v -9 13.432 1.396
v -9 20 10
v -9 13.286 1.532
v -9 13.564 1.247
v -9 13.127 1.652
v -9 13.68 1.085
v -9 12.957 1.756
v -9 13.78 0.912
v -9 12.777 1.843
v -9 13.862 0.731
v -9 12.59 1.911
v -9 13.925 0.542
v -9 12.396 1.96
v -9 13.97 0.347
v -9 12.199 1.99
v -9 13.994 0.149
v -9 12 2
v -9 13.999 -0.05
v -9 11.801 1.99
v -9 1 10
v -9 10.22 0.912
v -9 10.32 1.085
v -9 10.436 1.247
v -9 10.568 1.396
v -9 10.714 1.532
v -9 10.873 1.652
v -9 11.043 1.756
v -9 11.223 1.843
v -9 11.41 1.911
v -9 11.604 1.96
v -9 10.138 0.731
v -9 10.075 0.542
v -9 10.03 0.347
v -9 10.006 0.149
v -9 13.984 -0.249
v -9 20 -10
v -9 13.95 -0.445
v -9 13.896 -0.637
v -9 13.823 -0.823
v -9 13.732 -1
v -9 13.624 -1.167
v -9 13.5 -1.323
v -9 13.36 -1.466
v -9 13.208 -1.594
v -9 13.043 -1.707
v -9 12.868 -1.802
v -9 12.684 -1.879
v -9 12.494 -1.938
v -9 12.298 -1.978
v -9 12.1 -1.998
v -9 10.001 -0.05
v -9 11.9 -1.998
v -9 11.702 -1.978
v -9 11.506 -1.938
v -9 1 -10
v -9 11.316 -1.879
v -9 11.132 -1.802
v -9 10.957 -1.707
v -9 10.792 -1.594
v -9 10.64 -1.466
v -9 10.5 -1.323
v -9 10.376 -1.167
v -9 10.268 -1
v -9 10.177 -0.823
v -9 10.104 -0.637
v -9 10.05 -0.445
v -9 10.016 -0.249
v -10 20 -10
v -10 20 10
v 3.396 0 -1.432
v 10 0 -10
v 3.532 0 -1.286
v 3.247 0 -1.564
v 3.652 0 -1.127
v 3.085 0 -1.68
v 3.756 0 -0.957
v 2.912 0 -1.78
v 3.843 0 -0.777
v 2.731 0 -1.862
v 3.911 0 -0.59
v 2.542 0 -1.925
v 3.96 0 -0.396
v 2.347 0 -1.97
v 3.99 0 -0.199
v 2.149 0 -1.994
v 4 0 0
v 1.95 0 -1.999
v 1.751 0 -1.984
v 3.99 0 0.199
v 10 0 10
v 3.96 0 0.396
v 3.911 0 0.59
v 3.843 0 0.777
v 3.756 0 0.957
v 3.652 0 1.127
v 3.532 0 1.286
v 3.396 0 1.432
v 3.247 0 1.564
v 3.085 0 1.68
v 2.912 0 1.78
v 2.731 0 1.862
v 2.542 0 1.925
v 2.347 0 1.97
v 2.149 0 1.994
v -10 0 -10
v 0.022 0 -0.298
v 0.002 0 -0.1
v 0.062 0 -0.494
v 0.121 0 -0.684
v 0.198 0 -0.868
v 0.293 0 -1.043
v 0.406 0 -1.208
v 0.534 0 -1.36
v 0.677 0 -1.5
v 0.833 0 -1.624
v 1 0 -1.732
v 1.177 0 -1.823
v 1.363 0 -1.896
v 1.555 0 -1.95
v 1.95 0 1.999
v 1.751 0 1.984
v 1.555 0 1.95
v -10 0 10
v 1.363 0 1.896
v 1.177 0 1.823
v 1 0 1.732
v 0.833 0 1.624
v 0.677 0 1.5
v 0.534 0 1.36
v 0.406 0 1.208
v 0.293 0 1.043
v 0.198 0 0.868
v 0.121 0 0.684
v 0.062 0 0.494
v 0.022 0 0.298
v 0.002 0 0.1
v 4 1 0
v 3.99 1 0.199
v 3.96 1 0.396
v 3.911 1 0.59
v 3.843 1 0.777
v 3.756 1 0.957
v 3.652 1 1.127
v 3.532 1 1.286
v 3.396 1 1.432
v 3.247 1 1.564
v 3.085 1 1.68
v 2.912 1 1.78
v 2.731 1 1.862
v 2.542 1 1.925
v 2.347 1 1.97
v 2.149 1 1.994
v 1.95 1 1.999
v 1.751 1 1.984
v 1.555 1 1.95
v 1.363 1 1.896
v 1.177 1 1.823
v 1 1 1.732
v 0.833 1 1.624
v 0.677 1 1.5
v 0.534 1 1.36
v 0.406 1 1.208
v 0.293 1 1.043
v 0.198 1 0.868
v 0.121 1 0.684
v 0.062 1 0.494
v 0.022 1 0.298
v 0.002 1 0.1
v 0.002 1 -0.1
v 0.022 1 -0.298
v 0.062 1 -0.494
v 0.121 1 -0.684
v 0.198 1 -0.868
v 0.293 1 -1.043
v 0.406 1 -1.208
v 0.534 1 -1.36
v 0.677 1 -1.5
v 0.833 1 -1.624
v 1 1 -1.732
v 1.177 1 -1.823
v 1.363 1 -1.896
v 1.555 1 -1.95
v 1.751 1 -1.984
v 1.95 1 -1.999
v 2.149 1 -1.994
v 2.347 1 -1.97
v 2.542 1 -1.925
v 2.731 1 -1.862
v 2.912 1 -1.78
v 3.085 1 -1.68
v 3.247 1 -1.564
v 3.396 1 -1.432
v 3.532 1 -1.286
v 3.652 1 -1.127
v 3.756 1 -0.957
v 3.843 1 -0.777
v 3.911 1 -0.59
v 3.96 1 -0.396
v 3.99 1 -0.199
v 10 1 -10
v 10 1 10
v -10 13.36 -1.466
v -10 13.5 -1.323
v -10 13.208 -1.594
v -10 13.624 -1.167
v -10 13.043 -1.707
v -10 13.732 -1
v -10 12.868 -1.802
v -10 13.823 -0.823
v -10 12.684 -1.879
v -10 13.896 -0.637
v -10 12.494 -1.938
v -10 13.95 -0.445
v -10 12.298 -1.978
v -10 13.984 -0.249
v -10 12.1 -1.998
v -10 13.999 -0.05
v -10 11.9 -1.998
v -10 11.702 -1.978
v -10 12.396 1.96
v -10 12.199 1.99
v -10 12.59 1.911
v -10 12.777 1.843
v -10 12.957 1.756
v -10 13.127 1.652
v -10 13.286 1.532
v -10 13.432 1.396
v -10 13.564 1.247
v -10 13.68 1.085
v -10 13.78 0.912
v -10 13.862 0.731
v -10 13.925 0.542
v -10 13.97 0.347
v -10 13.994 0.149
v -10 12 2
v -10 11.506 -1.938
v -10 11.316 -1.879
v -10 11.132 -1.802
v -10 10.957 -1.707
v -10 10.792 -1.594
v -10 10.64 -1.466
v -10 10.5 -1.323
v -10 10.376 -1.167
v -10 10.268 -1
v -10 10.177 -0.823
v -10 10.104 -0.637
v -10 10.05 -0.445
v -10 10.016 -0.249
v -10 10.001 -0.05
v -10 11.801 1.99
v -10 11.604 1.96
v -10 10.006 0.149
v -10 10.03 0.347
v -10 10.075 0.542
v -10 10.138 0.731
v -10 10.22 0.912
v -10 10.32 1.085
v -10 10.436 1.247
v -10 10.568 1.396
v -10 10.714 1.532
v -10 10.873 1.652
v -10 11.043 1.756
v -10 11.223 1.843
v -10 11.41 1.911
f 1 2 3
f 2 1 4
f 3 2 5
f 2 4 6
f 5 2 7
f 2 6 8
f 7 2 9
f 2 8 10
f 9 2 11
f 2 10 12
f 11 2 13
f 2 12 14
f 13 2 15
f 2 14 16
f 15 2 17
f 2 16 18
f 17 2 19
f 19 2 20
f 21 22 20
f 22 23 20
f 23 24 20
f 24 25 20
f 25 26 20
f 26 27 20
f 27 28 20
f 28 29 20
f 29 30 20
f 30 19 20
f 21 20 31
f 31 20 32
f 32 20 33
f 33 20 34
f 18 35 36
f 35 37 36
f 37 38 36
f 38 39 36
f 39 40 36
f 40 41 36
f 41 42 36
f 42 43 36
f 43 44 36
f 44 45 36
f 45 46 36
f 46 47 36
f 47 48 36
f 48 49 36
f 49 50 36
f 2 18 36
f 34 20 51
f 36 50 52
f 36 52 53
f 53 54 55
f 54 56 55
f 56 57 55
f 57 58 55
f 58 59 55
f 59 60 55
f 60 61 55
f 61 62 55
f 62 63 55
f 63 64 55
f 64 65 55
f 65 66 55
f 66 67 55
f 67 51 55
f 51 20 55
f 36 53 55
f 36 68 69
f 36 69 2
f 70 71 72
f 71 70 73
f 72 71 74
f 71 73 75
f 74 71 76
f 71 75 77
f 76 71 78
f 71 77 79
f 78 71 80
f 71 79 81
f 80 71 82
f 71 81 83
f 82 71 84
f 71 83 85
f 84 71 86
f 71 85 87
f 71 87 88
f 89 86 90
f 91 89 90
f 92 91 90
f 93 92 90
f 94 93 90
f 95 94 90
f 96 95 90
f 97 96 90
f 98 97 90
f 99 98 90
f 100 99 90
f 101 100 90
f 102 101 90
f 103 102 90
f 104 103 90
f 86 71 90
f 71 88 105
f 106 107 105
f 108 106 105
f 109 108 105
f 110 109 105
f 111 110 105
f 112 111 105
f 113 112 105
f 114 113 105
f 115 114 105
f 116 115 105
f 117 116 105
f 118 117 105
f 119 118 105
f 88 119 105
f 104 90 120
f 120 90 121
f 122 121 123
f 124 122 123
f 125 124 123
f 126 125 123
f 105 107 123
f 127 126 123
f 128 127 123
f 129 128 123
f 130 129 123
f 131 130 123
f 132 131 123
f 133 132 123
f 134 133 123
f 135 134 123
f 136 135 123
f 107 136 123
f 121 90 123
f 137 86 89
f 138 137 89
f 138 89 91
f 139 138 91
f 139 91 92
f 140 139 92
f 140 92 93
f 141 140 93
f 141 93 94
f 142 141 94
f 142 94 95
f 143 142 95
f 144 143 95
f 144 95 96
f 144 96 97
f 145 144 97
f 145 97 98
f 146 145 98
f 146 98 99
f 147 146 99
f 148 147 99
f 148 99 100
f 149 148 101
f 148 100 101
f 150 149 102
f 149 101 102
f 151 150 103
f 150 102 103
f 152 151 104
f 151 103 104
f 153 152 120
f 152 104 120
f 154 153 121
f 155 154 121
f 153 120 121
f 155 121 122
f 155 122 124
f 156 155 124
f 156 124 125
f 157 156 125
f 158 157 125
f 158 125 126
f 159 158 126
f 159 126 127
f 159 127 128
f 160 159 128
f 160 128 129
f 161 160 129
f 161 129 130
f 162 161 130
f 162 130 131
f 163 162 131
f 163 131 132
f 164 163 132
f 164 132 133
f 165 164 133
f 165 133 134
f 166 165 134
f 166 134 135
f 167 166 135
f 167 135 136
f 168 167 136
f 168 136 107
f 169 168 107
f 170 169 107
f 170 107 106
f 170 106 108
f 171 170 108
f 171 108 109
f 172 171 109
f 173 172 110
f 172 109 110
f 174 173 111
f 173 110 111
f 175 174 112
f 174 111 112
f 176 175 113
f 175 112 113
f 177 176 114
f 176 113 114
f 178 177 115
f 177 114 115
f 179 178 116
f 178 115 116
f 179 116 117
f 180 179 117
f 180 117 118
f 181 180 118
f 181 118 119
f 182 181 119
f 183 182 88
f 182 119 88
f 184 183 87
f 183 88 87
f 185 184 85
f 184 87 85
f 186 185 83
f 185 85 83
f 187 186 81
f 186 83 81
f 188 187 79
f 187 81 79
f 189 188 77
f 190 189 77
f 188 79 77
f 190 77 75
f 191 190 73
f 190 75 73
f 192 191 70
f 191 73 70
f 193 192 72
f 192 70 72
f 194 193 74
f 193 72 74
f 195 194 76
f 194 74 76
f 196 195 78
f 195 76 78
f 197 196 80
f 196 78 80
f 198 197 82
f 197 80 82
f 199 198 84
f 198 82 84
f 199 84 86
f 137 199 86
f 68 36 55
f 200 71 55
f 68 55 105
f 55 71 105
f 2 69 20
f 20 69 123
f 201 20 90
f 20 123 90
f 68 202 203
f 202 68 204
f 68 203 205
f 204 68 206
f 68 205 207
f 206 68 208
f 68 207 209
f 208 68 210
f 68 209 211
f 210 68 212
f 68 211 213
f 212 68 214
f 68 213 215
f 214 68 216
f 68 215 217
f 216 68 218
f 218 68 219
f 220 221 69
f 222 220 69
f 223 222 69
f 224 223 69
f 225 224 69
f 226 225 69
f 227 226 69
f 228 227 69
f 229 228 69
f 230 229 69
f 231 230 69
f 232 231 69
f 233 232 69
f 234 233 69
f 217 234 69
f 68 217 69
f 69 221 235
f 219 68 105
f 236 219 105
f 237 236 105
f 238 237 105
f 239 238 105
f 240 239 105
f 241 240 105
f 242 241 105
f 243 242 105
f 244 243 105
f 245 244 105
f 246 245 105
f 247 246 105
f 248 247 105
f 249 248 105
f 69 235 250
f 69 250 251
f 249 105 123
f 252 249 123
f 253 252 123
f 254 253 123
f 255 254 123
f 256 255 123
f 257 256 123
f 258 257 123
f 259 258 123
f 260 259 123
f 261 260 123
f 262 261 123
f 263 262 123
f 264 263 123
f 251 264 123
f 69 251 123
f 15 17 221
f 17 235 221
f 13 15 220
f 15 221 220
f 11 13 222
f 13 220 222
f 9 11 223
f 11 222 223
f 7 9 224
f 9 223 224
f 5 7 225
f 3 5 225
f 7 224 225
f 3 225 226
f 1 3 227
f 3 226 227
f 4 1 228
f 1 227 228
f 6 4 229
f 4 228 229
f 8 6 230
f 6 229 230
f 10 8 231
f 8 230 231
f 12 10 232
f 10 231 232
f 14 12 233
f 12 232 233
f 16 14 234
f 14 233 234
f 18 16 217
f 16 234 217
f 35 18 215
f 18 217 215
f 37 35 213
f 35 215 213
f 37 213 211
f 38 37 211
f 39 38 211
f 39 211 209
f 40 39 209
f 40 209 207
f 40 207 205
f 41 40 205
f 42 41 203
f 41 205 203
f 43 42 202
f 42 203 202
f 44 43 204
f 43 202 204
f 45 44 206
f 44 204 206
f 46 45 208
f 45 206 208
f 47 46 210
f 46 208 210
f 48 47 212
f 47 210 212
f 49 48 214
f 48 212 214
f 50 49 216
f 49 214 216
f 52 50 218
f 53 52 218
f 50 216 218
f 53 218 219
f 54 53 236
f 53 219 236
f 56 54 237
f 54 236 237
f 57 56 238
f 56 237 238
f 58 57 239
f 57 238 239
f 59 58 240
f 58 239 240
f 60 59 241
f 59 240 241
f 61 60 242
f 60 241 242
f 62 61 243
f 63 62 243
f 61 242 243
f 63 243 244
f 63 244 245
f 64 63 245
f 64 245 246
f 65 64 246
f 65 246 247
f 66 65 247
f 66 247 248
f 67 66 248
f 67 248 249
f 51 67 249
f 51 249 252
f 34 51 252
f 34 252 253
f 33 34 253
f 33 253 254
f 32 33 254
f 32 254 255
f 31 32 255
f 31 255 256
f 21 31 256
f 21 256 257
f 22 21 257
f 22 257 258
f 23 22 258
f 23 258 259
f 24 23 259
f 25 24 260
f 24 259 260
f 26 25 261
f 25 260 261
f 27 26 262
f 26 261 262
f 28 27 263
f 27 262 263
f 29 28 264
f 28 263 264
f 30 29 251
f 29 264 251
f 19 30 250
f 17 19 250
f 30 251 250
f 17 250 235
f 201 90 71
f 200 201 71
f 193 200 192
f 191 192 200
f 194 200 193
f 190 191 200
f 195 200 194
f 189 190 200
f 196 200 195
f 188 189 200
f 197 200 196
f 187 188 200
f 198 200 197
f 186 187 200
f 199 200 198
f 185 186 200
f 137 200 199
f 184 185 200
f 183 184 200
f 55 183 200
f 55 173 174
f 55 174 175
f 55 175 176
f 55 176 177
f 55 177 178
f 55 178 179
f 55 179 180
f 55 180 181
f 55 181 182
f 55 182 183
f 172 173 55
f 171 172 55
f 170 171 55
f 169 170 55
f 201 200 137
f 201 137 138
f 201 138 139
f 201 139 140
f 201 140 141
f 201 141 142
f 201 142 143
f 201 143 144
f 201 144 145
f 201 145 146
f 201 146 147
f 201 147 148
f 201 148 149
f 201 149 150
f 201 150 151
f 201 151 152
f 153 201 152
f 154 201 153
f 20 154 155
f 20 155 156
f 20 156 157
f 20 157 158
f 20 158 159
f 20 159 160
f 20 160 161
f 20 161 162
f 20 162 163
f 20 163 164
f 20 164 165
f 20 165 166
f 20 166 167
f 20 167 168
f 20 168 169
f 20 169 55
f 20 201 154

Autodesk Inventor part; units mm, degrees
ref_plane "YZ Plane" through (0, 0, 0) normal (1, 0, 0) x (0, 1, 0)
ref_plane "XZ Plane" through (0, 0, 0) normal (0, 1, 0) x (-1, 0, 0)
ref_plane "XY Plane" through (0, 0, 0) normal (0, 0, 1) x (1, 0, 0)
sketch "Sketch1" plane through (0, 0, 0) normal (0, 1, 0) x (-1, 0, 0)
  line L0 (-10, -10) -> (10, -10)
  line L1 (10, -10) -> (10, 10)
  line L2 (10, 10) -> (-10, 10)
  line L3 (-10, 10) -> (-10, -10)
  line L4 (-10, -10) -> (10, 10) construction
  line L5 (10, -10) -> (-10, 10) construction
  point P0 (0, 0)
  dimension "d0" = 20
  dimension "d1" = 20
extrude "Extrusion1" add sketch "Sketch1" along normal blind 1
sketch "Sketch2" plane through (0, 1, 0) normal (0, 1, 0) x (1, 0, 0)
  line L0 (-10, -10) -> (10, -10) projected
  line L1 (10, 10) -> (-10, 10) projected
  line L2 (-10, -10) -> (-9, -10)
  line L3 (-9, -10) -> (-9, 10)
  line L4 (-9, 10) -> (-10, 10)
  line L5 (-10, 10) -> (-10, -10)
  point P0 (0, 0)
  dimension "d4" = 1
extrude "Extrusion2" add sketch "Sketch2" along normal blind 19
sketch "Sketch3" plane through (-10, 0, -10) normal (-1, 0, 0) x (0, 0, 1)
  circle A0 centre (10, 12) radius 2
  point P0 (10, 0)
  dimension "d7" = 4
extrude "Extrusion3" cut sketch "Sketch3" against normal blind 10
sketch "Sketch4" plane through (0, 0, 0) normal (0, -1, 0) x (1, 0, 0)
  circle A0 centre (2, 0) radius 2
  point P0 (0, 0)
extrude "Extrusion4" cut sketch "Sketch4" against normal blind 10
properties part number "trail 11"
